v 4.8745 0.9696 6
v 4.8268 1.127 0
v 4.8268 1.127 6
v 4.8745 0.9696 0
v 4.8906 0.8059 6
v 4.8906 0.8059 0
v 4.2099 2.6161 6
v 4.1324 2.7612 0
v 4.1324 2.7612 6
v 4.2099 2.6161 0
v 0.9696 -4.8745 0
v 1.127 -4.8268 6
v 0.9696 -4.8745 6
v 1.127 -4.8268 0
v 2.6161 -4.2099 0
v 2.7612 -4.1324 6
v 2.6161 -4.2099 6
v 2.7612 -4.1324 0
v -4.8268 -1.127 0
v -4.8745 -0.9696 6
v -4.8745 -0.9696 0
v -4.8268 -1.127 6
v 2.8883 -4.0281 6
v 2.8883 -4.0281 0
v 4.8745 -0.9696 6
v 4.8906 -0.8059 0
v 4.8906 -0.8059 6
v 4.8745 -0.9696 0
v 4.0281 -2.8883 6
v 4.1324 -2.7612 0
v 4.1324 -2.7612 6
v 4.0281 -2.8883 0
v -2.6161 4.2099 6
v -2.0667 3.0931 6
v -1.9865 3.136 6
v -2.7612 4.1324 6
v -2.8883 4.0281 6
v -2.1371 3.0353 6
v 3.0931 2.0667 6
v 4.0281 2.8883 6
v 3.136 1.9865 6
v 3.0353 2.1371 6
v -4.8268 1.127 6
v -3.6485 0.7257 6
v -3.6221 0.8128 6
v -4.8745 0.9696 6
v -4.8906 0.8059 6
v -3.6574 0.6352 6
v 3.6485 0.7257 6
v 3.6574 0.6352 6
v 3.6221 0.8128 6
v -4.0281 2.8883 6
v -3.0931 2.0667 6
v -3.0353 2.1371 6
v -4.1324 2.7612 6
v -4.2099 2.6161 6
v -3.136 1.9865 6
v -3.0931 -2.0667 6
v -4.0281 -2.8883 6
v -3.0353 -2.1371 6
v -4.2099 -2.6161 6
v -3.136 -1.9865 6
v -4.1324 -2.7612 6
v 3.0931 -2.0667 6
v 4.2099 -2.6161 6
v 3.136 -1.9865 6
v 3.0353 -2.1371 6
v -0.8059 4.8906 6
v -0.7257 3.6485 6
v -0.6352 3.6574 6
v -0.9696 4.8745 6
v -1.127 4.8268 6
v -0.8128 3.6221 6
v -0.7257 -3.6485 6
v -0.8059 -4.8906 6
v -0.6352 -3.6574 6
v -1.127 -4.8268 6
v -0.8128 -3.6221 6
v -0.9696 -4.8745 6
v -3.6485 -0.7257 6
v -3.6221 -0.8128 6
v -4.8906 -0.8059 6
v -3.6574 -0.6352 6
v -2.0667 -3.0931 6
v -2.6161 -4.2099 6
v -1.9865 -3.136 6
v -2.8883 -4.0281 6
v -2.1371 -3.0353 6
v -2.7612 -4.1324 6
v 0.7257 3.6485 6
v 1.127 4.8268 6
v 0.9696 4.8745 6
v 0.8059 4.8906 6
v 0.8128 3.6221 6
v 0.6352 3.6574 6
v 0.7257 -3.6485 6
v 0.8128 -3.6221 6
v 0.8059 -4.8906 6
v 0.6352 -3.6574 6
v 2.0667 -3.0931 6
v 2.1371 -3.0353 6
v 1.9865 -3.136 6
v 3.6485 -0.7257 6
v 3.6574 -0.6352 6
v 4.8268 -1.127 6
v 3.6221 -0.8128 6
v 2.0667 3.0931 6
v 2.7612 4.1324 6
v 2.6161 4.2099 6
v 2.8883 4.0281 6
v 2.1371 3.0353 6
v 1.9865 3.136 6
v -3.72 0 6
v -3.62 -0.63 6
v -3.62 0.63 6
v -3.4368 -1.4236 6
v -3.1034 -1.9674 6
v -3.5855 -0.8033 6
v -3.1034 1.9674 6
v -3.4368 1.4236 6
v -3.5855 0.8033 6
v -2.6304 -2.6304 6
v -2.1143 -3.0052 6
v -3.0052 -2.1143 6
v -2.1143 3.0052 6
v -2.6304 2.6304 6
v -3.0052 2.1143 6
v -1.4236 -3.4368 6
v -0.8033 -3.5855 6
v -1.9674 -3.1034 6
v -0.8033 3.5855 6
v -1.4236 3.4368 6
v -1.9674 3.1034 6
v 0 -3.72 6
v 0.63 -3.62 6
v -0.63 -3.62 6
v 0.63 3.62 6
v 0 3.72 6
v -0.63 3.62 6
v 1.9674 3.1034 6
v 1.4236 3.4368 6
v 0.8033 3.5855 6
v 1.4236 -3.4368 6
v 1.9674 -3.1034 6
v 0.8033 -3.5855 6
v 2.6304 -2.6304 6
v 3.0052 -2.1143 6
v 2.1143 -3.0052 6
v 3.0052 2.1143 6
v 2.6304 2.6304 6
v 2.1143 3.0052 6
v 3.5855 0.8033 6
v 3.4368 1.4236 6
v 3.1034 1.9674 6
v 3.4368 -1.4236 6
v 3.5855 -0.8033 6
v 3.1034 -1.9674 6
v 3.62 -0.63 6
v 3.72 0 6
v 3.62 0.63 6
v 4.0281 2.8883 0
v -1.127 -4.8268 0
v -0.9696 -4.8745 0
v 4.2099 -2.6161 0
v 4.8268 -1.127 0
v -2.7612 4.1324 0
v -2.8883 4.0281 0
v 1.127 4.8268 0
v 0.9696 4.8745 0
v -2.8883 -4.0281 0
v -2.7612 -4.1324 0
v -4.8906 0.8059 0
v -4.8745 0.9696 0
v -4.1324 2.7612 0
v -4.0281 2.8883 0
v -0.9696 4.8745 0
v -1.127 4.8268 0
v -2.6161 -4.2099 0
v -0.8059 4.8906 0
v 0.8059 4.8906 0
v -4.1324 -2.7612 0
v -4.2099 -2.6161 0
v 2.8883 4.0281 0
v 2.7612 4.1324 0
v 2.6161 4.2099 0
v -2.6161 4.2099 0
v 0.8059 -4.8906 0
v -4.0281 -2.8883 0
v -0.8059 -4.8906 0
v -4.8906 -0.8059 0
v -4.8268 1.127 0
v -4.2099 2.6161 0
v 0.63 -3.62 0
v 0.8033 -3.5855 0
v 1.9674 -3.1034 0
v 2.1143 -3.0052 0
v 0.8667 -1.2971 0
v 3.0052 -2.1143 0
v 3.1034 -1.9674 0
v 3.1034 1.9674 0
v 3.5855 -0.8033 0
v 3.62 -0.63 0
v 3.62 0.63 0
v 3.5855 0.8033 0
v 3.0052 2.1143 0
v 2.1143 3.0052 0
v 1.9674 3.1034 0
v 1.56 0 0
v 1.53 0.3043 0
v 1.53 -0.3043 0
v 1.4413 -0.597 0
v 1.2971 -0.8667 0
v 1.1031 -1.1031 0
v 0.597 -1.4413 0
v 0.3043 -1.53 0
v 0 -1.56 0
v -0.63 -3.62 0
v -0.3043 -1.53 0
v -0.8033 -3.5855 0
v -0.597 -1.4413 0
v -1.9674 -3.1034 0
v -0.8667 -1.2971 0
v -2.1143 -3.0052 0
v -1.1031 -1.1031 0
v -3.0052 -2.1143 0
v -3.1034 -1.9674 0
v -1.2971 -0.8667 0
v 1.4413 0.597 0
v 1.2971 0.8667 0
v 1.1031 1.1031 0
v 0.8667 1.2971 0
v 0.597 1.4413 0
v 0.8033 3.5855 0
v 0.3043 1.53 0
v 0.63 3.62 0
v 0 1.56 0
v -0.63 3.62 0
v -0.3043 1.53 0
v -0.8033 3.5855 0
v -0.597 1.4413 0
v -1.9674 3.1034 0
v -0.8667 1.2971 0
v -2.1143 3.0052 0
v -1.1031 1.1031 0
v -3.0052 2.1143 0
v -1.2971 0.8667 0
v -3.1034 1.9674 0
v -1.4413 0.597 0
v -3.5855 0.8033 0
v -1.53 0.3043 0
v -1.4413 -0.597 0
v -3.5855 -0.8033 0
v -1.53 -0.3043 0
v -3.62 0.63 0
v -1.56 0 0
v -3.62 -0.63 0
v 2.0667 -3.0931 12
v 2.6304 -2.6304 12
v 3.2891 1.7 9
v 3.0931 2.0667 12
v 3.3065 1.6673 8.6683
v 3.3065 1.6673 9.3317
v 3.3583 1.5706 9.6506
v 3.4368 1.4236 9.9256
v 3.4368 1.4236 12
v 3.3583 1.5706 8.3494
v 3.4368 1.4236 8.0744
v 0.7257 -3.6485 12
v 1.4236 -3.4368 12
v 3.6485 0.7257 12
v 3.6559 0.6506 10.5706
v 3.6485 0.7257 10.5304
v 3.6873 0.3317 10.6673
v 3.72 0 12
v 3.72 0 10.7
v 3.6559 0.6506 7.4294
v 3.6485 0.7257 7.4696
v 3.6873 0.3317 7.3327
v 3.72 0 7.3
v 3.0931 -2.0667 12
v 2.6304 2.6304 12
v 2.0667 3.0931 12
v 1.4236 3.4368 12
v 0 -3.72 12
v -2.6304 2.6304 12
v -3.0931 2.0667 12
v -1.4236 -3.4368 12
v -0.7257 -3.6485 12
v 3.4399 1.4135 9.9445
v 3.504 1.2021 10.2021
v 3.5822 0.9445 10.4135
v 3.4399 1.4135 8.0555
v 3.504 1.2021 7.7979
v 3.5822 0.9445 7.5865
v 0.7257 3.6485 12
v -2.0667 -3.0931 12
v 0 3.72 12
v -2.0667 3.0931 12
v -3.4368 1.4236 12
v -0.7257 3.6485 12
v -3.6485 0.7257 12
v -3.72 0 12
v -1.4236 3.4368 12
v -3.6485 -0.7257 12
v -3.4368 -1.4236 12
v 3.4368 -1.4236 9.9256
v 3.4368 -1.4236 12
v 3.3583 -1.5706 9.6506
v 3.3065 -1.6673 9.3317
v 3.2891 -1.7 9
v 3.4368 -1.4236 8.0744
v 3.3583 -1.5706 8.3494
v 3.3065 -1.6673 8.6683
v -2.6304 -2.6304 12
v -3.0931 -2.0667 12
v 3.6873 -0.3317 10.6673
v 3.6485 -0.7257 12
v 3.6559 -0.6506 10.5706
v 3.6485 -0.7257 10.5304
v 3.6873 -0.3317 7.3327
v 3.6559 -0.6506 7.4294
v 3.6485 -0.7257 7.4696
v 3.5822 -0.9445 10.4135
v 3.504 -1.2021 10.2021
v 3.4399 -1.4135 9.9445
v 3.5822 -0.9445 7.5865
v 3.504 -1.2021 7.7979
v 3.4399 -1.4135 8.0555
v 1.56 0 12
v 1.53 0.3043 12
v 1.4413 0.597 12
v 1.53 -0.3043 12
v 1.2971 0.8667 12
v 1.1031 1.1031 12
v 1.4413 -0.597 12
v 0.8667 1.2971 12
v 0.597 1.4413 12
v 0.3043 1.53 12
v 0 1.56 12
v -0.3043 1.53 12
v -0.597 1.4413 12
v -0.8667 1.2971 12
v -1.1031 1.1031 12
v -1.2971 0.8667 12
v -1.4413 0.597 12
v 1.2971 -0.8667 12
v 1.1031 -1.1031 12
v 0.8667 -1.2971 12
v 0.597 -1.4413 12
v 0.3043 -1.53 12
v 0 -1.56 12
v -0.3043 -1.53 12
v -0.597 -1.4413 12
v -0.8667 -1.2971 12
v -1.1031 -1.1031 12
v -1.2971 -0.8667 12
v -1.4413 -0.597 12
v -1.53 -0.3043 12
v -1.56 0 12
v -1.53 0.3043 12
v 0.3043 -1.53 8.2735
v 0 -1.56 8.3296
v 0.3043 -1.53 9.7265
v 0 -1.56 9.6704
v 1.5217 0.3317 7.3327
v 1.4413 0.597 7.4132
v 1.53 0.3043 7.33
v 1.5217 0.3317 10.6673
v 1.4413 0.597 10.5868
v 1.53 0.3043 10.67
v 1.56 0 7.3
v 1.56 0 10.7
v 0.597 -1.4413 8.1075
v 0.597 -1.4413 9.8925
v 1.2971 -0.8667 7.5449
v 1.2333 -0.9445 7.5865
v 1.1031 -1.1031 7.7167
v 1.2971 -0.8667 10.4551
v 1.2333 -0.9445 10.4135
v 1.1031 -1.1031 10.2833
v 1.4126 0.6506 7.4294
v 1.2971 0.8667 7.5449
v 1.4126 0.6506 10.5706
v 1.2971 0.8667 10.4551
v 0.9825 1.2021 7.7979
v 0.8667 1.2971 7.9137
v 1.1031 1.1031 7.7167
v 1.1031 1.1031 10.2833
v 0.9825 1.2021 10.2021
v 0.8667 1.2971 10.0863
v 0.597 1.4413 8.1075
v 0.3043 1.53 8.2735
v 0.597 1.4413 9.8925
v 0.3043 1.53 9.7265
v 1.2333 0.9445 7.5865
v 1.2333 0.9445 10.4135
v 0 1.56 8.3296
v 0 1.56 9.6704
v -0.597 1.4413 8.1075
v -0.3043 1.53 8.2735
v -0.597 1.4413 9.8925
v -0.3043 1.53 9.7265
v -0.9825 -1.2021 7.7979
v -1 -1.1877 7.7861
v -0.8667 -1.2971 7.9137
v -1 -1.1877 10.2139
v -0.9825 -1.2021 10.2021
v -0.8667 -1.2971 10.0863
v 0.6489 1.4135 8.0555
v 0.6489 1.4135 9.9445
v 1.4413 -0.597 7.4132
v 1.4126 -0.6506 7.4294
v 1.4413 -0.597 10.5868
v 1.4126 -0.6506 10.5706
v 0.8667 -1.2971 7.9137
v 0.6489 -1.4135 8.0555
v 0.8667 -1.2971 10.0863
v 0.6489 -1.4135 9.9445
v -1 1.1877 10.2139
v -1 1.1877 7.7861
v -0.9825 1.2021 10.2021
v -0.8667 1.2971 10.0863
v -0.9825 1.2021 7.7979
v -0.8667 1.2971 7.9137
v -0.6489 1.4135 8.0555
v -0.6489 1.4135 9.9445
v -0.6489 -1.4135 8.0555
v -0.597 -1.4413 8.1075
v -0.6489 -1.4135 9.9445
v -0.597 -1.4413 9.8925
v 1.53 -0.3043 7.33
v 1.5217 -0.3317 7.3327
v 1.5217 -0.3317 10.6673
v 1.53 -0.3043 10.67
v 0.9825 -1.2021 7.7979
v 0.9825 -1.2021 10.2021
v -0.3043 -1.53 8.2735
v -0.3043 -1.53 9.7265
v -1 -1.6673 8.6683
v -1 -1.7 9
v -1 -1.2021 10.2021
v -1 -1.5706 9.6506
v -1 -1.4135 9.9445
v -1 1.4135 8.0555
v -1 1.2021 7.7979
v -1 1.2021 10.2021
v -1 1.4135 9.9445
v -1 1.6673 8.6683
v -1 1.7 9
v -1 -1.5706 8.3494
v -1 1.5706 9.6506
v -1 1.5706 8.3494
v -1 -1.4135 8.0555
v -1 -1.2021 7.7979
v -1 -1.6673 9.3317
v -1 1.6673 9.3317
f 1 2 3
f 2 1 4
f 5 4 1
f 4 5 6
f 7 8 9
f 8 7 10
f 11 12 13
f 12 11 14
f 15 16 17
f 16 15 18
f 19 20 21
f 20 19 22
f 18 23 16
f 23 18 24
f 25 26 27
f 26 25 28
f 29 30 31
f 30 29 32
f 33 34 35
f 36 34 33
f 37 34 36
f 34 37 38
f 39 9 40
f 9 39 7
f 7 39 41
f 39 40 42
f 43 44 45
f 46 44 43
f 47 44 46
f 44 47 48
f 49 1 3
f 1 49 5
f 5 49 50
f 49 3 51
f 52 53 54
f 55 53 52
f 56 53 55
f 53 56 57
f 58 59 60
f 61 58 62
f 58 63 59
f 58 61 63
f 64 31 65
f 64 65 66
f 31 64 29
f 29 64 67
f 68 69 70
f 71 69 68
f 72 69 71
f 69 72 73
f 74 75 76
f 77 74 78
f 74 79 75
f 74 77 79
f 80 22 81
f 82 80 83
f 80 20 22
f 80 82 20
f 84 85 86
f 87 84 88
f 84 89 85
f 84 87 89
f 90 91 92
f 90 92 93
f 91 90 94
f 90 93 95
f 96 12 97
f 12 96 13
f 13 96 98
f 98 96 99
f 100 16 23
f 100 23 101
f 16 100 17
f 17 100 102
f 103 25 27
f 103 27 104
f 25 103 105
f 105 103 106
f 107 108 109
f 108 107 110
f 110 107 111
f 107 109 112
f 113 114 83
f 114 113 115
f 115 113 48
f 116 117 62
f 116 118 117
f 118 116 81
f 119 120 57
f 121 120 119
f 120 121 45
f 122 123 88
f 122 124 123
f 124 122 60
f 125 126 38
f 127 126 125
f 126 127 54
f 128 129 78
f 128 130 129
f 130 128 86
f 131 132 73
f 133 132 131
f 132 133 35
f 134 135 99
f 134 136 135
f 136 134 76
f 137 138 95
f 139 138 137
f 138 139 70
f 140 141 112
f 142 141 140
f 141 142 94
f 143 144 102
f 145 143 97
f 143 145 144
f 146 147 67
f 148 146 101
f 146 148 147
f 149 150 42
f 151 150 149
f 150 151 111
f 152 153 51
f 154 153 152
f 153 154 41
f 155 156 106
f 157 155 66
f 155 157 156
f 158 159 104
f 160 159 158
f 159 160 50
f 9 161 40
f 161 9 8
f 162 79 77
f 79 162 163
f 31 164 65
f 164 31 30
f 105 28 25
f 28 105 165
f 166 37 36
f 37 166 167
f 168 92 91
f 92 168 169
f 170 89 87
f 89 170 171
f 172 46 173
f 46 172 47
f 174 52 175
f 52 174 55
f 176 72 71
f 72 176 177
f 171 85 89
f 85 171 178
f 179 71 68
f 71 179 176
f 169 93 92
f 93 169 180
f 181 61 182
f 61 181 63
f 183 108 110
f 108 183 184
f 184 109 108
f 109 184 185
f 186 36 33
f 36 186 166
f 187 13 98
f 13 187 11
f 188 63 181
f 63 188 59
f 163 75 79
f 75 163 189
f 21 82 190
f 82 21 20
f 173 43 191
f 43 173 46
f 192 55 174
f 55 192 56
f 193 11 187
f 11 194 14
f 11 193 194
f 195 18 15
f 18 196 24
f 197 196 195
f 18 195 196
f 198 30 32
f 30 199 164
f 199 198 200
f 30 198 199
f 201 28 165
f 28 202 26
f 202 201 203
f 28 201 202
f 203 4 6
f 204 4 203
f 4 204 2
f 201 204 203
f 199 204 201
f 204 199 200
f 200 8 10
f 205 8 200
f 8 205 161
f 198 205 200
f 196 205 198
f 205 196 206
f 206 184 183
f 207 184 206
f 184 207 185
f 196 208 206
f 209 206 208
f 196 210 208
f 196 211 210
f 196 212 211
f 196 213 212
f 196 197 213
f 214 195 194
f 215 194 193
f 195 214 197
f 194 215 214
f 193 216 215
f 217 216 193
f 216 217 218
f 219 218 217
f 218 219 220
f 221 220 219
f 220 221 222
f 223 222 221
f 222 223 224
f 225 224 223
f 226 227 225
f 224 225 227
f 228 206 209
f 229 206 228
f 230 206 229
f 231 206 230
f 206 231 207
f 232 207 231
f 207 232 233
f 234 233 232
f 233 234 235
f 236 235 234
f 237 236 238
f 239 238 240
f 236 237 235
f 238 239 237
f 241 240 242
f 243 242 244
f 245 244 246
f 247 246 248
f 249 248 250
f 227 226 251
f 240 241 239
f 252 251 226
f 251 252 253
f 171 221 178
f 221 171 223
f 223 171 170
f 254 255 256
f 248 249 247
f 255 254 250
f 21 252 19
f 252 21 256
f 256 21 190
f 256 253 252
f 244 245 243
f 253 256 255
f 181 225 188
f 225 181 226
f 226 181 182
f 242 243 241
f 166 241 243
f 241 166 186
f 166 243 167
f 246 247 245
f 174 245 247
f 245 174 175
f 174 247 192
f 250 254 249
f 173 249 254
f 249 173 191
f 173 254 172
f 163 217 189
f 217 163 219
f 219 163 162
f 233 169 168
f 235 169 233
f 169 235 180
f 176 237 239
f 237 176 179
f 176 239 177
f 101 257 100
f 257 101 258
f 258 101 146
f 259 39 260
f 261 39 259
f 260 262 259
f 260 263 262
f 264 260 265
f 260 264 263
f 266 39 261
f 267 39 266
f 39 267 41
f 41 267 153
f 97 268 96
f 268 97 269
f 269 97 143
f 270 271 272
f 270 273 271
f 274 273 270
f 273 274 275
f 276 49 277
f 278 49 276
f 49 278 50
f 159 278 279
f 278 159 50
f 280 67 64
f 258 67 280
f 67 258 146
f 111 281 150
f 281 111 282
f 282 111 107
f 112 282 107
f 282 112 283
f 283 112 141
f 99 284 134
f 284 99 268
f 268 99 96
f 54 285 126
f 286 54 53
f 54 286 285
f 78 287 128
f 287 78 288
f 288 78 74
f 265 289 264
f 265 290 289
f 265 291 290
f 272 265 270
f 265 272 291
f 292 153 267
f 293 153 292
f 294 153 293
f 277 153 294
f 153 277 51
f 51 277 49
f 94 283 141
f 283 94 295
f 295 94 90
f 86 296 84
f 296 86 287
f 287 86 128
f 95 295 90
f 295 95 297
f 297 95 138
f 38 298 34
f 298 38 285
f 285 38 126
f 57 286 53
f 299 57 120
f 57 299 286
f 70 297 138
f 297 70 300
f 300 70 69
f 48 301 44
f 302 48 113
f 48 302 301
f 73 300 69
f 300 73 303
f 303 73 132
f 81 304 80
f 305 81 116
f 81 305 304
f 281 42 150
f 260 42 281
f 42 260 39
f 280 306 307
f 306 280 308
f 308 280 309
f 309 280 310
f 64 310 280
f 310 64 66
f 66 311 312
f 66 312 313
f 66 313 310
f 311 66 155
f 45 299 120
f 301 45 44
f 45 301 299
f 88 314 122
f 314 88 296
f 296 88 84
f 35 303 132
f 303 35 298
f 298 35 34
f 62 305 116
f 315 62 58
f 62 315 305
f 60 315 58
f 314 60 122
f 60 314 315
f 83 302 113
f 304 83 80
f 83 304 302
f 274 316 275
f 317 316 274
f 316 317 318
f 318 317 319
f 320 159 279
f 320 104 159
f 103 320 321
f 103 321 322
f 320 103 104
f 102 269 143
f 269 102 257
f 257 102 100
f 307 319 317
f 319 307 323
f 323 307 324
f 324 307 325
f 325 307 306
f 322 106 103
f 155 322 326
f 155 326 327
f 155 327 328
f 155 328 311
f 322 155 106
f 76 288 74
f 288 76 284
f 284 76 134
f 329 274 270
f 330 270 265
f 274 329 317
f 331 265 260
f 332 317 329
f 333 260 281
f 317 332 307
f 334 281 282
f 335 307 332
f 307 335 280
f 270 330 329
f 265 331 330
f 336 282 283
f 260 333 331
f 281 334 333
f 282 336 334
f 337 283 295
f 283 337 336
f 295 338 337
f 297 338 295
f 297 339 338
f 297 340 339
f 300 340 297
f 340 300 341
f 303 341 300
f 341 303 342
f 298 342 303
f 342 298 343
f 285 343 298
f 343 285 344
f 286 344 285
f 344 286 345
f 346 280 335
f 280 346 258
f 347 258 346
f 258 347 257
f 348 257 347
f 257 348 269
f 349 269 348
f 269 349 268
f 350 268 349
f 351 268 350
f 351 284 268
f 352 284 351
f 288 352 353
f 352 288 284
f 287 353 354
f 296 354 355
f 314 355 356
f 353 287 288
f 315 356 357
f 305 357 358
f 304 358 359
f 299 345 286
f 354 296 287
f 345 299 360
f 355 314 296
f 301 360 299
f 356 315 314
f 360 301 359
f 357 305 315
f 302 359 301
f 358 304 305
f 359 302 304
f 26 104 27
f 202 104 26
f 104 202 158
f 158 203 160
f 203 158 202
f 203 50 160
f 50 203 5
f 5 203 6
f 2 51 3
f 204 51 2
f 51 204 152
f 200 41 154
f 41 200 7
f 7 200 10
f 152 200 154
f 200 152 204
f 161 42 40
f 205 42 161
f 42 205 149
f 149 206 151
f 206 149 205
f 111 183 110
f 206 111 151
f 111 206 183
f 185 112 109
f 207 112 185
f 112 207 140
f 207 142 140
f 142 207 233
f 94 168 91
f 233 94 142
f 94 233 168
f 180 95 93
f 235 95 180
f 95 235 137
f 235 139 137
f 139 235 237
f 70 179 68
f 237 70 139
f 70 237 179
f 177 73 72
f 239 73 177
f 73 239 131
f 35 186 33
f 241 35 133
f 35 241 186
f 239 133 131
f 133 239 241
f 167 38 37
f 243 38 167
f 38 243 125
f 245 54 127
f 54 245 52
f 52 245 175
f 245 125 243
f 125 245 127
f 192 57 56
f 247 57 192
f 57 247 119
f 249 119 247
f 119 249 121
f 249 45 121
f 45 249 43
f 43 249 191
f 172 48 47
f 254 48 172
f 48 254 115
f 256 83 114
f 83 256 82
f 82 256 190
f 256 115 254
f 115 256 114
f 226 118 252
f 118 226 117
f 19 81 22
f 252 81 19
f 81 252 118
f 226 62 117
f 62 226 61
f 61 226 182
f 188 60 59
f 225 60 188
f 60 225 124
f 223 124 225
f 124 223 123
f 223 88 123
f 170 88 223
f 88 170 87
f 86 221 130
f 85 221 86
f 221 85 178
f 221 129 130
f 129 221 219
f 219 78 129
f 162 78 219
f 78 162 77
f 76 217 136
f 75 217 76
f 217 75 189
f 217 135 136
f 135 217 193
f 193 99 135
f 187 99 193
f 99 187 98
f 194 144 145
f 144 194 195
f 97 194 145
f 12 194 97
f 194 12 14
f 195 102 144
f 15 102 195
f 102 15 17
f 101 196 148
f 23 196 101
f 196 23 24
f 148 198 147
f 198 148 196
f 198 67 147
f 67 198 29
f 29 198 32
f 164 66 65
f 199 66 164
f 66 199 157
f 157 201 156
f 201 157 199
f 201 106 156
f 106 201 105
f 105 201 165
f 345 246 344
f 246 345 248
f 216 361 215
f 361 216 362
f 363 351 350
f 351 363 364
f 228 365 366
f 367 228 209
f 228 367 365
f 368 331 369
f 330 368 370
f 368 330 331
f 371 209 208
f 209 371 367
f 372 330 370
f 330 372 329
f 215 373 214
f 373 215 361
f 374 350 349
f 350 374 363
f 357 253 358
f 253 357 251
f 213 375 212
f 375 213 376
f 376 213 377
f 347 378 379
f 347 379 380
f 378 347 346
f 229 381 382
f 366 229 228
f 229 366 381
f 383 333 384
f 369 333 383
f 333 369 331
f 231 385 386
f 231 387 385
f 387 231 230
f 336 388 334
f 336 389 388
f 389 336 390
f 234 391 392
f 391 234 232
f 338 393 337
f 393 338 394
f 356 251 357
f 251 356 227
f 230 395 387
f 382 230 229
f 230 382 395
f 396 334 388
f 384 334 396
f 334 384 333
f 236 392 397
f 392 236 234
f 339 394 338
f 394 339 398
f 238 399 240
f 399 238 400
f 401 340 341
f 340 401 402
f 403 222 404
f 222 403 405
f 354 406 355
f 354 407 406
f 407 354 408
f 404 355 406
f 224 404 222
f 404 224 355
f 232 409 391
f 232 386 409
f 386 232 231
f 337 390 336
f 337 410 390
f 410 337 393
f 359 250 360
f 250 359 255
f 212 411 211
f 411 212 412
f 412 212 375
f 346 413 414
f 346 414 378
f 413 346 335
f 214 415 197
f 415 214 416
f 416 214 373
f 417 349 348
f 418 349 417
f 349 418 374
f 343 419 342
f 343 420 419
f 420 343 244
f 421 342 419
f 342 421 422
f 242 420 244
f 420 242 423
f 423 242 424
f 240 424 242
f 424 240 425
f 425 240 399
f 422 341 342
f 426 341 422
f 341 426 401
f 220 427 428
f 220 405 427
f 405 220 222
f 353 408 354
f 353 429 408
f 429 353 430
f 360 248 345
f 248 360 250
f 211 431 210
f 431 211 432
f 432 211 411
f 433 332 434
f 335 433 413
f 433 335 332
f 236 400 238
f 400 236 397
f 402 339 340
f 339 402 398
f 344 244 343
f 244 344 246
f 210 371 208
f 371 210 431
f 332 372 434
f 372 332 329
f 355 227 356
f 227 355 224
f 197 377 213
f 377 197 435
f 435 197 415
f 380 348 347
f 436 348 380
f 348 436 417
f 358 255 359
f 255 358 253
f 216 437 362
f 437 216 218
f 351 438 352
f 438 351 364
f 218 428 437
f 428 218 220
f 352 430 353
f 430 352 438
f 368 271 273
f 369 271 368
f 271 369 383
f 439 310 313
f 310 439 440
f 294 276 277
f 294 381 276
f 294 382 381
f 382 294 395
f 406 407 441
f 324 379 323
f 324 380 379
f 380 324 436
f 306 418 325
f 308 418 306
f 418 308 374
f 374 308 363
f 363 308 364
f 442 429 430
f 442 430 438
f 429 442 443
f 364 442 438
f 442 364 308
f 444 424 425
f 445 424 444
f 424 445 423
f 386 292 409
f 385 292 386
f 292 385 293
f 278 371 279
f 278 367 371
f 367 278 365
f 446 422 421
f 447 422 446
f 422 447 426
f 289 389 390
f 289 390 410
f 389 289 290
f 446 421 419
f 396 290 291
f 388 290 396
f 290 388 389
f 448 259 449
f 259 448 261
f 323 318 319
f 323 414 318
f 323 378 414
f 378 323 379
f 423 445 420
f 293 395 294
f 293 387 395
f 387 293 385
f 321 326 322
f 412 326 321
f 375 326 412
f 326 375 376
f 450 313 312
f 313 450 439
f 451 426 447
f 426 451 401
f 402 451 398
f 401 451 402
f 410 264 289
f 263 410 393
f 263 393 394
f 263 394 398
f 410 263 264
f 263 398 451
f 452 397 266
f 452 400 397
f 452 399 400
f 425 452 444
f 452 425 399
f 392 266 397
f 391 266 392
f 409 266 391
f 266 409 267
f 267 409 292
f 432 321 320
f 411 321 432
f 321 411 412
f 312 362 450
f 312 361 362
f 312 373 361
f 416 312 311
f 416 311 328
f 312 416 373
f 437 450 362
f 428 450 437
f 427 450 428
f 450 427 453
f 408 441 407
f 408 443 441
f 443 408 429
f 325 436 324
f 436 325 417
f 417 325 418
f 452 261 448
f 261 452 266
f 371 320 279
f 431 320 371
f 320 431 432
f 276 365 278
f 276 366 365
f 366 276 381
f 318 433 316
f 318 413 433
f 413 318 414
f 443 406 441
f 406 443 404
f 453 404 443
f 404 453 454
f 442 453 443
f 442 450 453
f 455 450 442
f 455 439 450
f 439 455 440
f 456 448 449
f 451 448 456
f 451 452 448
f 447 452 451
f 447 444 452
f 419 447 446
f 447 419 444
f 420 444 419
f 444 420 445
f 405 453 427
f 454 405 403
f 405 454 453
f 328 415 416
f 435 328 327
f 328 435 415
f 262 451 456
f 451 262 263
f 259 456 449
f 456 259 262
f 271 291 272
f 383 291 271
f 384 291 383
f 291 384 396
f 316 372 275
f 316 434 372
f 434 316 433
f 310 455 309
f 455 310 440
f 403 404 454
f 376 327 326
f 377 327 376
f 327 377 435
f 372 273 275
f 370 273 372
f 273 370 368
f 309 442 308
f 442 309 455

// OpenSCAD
$fn = 32;

// ----------------------------------------------------------------------
// Timing pulley: GT2 16T, pitch 2 mm, 9.94 mm x 12 mm
// ----------------------------------------------------------------------

// --- parameters (mm) ---
pitch_mm = 2;             // belt pitch
tooth_count = 16;         // number of grooves
width = 6;                // belt width between the flanges
tip_d = 9.94;             // tip circle diameter
root_d = 8.44;            // groove bottom diameter
groove_h = 0.75;          // groove depth
tooth_w = 1.5;            // groove width at the tip circle
hub_bore = 3.12;          // shaft bore
hub_d = 7.44;             // hub diameter
hub_h = 6;                // hub above the flange
bottom_z = 0;             // lowest point of the pulley
top_z = 12;               // highest point of the pulley
set_d = 3.4;              // set screw tap hole

module rim() {
  cylinder(h = width, d = tip_d);
}

module groove_cutter() {
  /* belt tooth groove: deeper than wide, cut through the belt width */
  translate([root_d / 2, 0, 0])
    linear_extrude(height = width)
      polygon(points = [[-0.6, -tooth_w * 0.42], [groove_h + 0.6, -tooth_w * 0.6],
                        [groove_h + 0.6, tooth_w * 0.6], [-0.6, tooth_w * 0.42]]);
}

module hub() {
  translate([0, 0, bottom_z]) cylinder(h = top_z - bottom_z, d = hub_d);
}

difference() {
  union() {
    rim();
    hub();
  }
  for (i = [0 : tooth_count - 1]) rotate([0, 0, i * 360 / tooth_count]) groove_cutter();
  translate([0, 0, bottom_z - 1]) cylinder(h = top_z - bottom_z + 2, d = hub_bore);
  translate([-1, 0, top_z - hub_h * 0.5]) rotate([0, 90, 0]) cylinder(h = hub_d / 2 + 3, d = set_d);
}
